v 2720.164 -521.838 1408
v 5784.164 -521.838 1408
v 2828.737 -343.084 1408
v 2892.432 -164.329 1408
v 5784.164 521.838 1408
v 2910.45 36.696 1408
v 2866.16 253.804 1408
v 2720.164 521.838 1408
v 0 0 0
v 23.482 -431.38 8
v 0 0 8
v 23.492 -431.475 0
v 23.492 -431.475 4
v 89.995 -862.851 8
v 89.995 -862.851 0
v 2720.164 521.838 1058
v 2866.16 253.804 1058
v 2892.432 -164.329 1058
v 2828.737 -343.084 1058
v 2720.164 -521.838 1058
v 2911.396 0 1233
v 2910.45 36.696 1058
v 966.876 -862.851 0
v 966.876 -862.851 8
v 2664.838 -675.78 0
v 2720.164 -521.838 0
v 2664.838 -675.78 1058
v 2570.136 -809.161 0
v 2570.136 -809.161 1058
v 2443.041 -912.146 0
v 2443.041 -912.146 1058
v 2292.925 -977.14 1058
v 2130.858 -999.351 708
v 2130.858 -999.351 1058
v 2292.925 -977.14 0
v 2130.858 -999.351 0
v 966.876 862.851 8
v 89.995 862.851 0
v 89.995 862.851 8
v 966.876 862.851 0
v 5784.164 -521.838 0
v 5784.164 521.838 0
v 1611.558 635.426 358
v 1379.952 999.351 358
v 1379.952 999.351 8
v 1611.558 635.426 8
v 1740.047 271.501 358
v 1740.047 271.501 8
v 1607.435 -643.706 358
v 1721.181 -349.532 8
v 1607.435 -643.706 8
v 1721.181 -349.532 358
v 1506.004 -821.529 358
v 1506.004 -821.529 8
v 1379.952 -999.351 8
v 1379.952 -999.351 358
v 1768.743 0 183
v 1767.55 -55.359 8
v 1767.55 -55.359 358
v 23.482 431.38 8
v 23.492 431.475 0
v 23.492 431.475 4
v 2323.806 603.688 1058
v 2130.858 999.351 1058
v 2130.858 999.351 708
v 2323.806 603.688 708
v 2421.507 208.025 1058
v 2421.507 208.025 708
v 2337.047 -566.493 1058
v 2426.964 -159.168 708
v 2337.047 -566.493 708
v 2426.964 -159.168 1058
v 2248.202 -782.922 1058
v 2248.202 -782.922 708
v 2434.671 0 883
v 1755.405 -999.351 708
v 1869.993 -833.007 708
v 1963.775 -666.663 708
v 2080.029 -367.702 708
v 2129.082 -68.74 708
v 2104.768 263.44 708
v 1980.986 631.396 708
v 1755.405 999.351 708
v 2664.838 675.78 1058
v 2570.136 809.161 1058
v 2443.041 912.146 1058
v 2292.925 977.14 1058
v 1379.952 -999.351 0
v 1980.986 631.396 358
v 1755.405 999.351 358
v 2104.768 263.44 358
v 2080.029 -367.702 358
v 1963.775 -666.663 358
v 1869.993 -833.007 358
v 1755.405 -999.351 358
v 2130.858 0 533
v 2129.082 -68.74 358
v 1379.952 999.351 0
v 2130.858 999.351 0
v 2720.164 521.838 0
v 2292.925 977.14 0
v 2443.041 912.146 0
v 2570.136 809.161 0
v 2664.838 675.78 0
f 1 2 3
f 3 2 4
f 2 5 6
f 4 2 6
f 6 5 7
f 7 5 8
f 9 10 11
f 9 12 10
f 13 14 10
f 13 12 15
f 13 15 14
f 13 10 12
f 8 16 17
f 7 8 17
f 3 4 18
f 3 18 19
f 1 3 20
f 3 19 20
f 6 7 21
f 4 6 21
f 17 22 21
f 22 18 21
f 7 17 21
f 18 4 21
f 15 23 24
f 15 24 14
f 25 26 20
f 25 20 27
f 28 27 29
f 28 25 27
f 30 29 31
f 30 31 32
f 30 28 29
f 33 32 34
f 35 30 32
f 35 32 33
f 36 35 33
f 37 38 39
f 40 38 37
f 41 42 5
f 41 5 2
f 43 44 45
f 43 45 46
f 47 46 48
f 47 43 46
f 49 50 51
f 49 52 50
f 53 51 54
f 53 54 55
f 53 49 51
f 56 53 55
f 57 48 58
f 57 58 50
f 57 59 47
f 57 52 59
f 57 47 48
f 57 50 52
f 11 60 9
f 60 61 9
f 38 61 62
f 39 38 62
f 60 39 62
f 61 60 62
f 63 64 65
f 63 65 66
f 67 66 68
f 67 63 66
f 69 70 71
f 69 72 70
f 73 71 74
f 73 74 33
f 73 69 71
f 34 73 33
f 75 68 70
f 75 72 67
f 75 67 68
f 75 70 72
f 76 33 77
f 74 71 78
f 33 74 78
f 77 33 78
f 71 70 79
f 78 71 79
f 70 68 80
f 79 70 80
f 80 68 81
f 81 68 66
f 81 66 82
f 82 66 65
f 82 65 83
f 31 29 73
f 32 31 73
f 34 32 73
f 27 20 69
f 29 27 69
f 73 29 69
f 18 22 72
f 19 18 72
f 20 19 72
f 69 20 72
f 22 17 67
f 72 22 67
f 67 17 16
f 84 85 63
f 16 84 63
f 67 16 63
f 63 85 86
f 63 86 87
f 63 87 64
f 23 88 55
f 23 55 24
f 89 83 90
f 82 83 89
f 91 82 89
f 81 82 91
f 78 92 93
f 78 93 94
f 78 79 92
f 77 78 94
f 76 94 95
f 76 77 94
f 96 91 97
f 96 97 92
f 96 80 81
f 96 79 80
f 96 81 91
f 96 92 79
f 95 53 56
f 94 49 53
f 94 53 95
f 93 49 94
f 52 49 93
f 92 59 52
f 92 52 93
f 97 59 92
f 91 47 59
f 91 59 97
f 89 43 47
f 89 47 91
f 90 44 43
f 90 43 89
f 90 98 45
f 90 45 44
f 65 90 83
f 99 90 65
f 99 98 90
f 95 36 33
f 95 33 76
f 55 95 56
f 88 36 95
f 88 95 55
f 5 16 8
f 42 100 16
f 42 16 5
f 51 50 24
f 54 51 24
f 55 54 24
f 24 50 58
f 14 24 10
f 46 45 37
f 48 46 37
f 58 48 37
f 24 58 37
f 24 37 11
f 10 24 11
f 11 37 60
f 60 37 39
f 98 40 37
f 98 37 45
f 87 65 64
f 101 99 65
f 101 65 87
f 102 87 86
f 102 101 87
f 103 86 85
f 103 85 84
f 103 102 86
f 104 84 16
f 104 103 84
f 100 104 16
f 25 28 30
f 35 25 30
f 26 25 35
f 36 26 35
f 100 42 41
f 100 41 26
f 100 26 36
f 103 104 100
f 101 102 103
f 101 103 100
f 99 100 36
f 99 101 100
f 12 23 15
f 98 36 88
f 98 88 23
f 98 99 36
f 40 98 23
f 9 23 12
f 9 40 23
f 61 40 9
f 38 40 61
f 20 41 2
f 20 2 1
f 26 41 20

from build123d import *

# Parameters (mm, degrees)
BOSS_EXTRU_2_DEPTH       = 1408
ENL_V_START              = 1058
ENL_V_MAT_EXTRU_9_DEPTH  = 350
ENL_V_MAT_EXTRU_10_DEPTH = 350
ENL_V_MAT_EXTRU_11_DEPTH = 350
ENL_V_MAT_EXTRU_12_DEPTH = 350


with BuildPart() as part:
    # Esquisse2 → Boss.-Extru.2 (new body)
    with BuildSketch(Plane.XY):
        with BuildLine():
            Line((2720.163515451, 521.837758863), (5784.163515451, 521.837758863))
            Line((5784.163515451, 521.837758863), (5784.163515451, -521.837758863))
            Line((5784.163515451, -521.837758863), (2720.163515451, -521.837758863))
            ThreePointArc((2720.163515451, -521.837758863), (2510.100903564, -864.987952329), (2130.858380196, -999.35113426))
            Line((2130.858380196, -999.35113426), (1379.952136984, -999.35113426))
            Line((1379.952136984, -999.35113426), (966.87581893, -862.850763473))
            Line((966.87581893, -862.850763473), (89.994512184, -862.850763473))
            add(Edge.make_bspline(
                [(89.994512184, -862.850763473), (1.98722085, -431.524414356), (0, 0)],
                knots=[0, 0, 0, 0.488709908, 0.488709908, 0.488709908], degree=2))
            add(Edge.make_bspline(
                [(89.994512184, 862.850763473), (1.98722085, 431.524414356), (0, 0)],
                knots=[0, 0, 0, 0.488709908, 0.488709908, 0.488709908], degree=2))
            Line((89.994512184, 862.850763473), (966.87581893, 862.850763473))
            Line((966.87581893, 862.850763473), (1379.952136984, 999.35113426))
            Line((1379.952136984, 999.35113426), (2130.858380196, 999.35113426))
            ThreePointArc((2130.858380196, 999.35113426), (2510.100903564, 864.987952329), (2720.163515451, 521.837758863))
        make_face()
    extrude(amount=BOSS_EXTRU_2_DEPTH)

    # Esquisse3 → Enlèv. mat.-Extru.9 (cut)
    with BuildSketch(Plane.XY.offset(ENL_V_START)):
        with BuildLine():
            Line((1379.952136984, 999.351134268), (2130.858380196, 999.351134268))
            ThreePointArc((2130.858380196, 999.351134268), (2510.100903563, 864.987952337), (2720.163515451, 521.837758871))
            add(Edge.make_bspline(
                [(2720.163515451, 521.837758871), (3102.628436134, 8e-09), (2720.163515451, -521.837758855)],
                knots=[0, 0, 0, 1, 1, 1], degree=2))
            ThreePointArc((2720.163515451, -521.837758855), (2510.100903563, -864.987952321), (2130.858380196, -999.351134252))
            Line((2130.858380196, -999.351134252), (1379.952136984, -999.351134252))
            Line((1379.952136984, -999.351134252), (966.87581893, -862.850763465))
            Line((966.87581893, -862.850763465), (89.994512183, -862.850763465))
            add(Edge.make_bspline(
                [(89.994512183, -862.850763465), (1.98722085, -431.524414347), (0, 8e-09)],
                knots=[0, 0, 0, 0.488709908, 0.488709908, 0.488709908], degree=2))
            add(Edge.make_bspline(
                [(89.994512183, 862.850763482), (1.98722085, 431.524414364), (0, 8e-09)],
                knots=[0, 0, 0, 0.488709908, 0.488709908, 0.488709908], degree=2))
            Line((89.994512183, 862.850763482), (966.87581893, 862.850763482))
            Line((966.87581893, 862.850763482), (1379.952136984, 999.351134268))
        make_face()
    extrude(amount=ENL_V_MAT_EXTRU_9_DEPTH, mode=Mode.SUBTRACT)

    # Esquisse9 → Enlèv. mat.-Extru.10 (cut)
    with BuildSketch(Plane.XY.offset(1058)):
        with BuildLine():
            add(Edge.make_bspline(
                [(2130.858380196, 999.35113426), (2738.483910579, 0), (2130.858380196, -999.35113426)],
                knots=[0, 0, 0, 1, 1, 1], degree=2))
            Line((2130.858380196, -999.35113426), (1379.952136984, -999.351134252))
            Line((1379.952136984, -999.351134252), (966.87581893, -862.850763465))
            Line((966.87581893, -862.850763465), (89.994512183, -862.850763465))
            add(Edge.make_bspline(
                [(0, 8e-09), (1.98722085, -431.524414347), (89.994512183, -862.850763465)],
                knots=[0, 0, 0, 1, 1, 1], degree=2))
            add(Edge.make_bspline(
                [(89.994512183, 862.850763482), (1.98722085, 431.524414364), (0, 8e-09)],
                knots=[0, 0, 0, 1, 1, 1], degree=2))
            Line((89.994512183, 862.850763482), (966.87581893, 862.850763482))
            Line((966.87581893, 862.850763482), (1379.952136984, 999.351134268))
            Line((1379.952136984, 999.351134268), (2130.858380196, 999.35113426))
        make_face()
    extrude(amount=-ENL_V_MAT_EXTRU_10_DEPTH, mode=Mode.SUBTRACT)

    # Esquisse10 → Enlèv. mat.-Extru.11 (cut)
    with BuildSketch(Plane.XY.offset(708)):
        with BuildLine():
            Line((1755.405258589, 999.351134268), (1379.952136984, 999.351134268))
            Line((1379.952136984, 999.351134268), (966.87581893, 862.850763473))
            Line((966.87581893, 862.850763473), (89.994512184, 862.850763473))
            add(Edge.make_bspline(
                [(89.994512184, 862.850763473), (1.98722085, 431.524414356), (0, 0)],
                knots=[0, 0, 0, 0.488709908, 0.488709908, 0.488709908], degree=2))
            add(Edge.make_bspline(
                [(89.994512184, -862.850763473), (1.98722085, -431.524414356), (0, 0)],
                knots=[0, 0, 0, 0.488709908, 0.488709908, 0.488709908], degree=2))
            Line((89.994512184, -862.850763473), (966.87581893, -862.850763473))
            Line((966.87581893, -862.850763473), (1379.952136984, -999.35113426))
            Line((1379.952136984, -999.35113426), (1755.40525859, -999.35113426))
            add(Edge.make_bspline(
                [(1755.405258589, 999.351134268), (2506.311501802, 3e-09), (1755.40525859, -999.35113426)],
                knots=[0, 0, 0, 1, 1, 1], degree=2))
        make_face()
    extrude(amount=-ENL_V_MAT_EXTRU_11_DEPTH, mode=Mode.SUBTRACT)

    # Esquisse11 → Enlèv. mat.-Extru.12 (cut)
    with BuildSketch(Plane.XY.offset(358)):
        with BuildLine():
            Line((966.87581893, -862.850763465), (89.994512183, -862.850763465))
            add(Edge.make_bspline(
                [(89.994512183, -862.850763465), (-89.994512183, 8e-09), (89.994512183, 862.850763482)],
                knots=[0, 0, 0, 1, 1, 1], degree=2))
            Line((89.994512183, 862.850763482), (966.87581893, 862.850763482))
            Line((966.87581893, 862.850763482), (1379.952136984, 999.351134268))
            add(Edge.make_bspline(
                [(1379.952136984, 999.351134268), (2157.533266673, 6e-09), (1379.952136984, -999.351134252)],
                knots=[0, 0, 0, 1, 1, 1], degree=2))
            Line((1379.952136984, -999.351134252), (966.87581893, -862.850763465))
        make_face()
    extrude(amount=-ENL_V_MAT_EXTRU_12_DEPTH, mode=Mode.SUBTRACT)


solid = part.part
